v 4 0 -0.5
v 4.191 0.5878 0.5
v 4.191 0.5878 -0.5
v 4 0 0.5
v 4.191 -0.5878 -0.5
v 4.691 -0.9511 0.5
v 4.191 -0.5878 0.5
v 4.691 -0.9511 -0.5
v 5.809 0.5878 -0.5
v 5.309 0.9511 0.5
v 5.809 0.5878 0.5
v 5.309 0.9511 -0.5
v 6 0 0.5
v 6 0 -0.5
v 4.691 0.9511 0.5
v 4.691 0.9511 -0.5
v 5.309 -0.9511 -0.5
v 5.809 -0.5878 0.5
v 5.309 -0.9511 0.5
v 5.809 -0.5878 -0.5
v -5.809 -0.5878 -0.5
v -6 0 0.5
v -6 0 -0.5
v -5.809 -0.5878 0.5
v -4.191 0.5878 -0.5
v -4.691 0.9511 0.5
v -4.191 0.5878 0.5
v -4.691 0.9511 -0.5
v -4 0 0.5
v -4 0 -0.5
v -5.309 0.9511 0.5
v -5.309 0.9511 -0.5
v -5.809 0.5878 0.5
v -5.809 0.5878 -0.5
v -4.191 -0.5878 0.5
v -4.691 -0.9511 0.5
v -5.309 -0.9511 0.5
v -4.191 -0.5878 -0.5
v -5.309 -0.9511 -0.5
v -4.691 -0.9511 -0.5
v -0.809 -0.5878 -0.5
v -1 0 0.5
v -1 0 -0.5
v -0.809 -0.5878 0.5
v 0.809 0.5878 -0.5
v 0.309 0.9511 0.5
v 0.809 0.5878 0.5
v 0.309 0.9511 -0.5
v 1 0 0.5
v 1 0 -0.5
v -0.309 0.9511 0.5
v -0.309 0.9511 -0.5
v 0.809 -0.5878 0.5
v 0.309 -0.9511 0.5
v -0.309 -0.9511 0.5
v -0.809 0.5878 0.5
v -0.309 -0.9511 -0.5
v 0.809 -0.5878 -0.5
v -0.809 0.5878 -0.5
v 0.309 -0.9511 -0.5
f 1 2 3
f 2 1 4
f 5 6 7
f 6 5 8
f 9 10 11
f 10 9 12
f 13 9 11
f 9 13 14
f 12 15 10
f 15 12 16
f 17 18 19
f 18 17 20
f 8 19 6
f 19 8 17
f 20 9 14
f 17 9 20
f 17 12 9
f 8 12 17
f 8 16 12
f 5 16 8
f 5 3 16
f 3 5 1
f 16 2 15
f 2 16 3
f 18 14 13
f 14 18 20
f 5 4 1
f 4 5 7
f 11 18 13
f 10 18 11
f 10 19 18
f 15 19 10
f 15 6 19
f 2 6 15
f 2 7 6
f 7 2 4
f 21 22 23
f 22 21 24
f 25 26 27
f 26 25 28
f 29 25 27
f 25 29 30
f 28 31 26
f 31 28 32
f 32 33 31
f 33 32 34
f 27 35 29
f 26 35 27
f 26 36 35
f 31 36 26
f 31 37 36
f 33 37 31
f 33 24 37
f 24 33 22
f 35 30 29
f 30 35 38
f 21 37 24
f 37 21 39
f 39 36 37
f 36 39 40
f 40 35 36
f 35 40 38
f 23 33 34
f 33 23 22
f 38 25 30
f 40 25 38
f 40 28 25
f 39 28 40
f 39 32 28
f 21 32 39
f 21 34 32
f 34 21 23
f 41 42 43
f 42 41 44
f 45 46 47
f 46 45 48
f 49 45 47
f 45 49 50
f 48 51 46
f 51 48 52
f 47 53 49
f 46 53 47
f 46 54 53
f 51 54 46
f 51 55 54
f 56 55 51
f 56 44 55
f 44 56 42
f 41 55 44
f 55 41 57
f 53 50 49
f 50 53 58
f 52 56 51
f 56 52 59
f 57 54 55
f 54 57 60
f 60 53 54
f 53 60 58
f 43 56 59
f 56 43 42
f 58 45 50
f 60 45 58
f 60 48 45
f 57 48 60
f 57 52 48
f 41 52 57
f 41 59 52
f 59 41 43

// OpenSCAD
$fn=10;

gHeigth=203;
gX=20;
gY=20;
gY2=31.8;

gFootX=4;
gWallthickness=3;

//translate([11+10,-300-17.35,-28])
// import("../files/Pattes.stl");

triagleCylinderE(10, 10, 1, 2);

//difference(){
// union(){
//  plate4Point(gX,gY,gHeigth,5); // Shaft
//  translate([0,0,(gHeigth/2)-(gFootX/2)])
//   cube([gX,gY2,gFootX],center=true); // Top foot
//  translate([0,0,-(gHeigth/2)+(gFootX/2)])
//   cube([gX,gY2,gFootX],center=true); // Bot foot
//  translate([0,0,33])
//   cube([gX,gY2,40],center=true); // Middle 
// }
// plate4Point(gX-gWallthickness,gY-gWallthickness,gHeigth+1,5); // Cutout Center
//} 
////////////////////////////////////////////////////////////////////////////////////////////////////
 module plate4Point(x,y,z,d){
 hull(){
  color("green") translate([(x/2)-(d/2) ,(y/2) -(d/2),0]) cylinder(h=z, d=d, center=true);
	color("blue")  translate([(x/2)-(d/2) ,-(y/2)+(d/2),0]) cylinder(h=z, d=d, center=true);
	color("red")   translate([-(x/2)+(d/2),(y/2) -(d/2),0]) cylinder(h=z, d=d, center=true);
	color("grey")  translate([-(x/2)+(d/2),-(y/2)+(d/2),0]) cylinder(h=z, d=d, center=true);
 }
}
////////////////////////////////////////////////////////////////////////////////////////////////////
module triagleCylinderE(iW, iY, iZ, iD){
 halfD = iD/2;
 halfW = iW/2;
// hull(){
  color("red")	 translate([halfW , 0, 0]) cylinder(d=iD,h=iZ,center=true);
  color("grey")	 translate([-halfW, 0, 0]) cylinder(d=iD,h=iZ,center=true);
  color("green") translate([0, 0, 0]) cylinder(d=iD,h=iZ,center=true);
	
//  color("grey")	 translate([-iX+halfD, (iY/2)-halfD, halfD]) sphere(d=iD);
//  color("green") translate([-halfD   , (iY/2)-halfD, iZ-halfD]) sphere(d=iD);

//  color("red")	 translate([-halfD   , -(iY/2)+halfD, halfD]) sphere(d=iD);
//  color("grey")	 translate([-iX+halfD, -(iY/2)+halfD, halfD]) sphere(d=iD);
//	color("green") translate([-halfD   , -(iY/2)+halfD, iZ-halfD]) sphere(d=iD);
// }
}
